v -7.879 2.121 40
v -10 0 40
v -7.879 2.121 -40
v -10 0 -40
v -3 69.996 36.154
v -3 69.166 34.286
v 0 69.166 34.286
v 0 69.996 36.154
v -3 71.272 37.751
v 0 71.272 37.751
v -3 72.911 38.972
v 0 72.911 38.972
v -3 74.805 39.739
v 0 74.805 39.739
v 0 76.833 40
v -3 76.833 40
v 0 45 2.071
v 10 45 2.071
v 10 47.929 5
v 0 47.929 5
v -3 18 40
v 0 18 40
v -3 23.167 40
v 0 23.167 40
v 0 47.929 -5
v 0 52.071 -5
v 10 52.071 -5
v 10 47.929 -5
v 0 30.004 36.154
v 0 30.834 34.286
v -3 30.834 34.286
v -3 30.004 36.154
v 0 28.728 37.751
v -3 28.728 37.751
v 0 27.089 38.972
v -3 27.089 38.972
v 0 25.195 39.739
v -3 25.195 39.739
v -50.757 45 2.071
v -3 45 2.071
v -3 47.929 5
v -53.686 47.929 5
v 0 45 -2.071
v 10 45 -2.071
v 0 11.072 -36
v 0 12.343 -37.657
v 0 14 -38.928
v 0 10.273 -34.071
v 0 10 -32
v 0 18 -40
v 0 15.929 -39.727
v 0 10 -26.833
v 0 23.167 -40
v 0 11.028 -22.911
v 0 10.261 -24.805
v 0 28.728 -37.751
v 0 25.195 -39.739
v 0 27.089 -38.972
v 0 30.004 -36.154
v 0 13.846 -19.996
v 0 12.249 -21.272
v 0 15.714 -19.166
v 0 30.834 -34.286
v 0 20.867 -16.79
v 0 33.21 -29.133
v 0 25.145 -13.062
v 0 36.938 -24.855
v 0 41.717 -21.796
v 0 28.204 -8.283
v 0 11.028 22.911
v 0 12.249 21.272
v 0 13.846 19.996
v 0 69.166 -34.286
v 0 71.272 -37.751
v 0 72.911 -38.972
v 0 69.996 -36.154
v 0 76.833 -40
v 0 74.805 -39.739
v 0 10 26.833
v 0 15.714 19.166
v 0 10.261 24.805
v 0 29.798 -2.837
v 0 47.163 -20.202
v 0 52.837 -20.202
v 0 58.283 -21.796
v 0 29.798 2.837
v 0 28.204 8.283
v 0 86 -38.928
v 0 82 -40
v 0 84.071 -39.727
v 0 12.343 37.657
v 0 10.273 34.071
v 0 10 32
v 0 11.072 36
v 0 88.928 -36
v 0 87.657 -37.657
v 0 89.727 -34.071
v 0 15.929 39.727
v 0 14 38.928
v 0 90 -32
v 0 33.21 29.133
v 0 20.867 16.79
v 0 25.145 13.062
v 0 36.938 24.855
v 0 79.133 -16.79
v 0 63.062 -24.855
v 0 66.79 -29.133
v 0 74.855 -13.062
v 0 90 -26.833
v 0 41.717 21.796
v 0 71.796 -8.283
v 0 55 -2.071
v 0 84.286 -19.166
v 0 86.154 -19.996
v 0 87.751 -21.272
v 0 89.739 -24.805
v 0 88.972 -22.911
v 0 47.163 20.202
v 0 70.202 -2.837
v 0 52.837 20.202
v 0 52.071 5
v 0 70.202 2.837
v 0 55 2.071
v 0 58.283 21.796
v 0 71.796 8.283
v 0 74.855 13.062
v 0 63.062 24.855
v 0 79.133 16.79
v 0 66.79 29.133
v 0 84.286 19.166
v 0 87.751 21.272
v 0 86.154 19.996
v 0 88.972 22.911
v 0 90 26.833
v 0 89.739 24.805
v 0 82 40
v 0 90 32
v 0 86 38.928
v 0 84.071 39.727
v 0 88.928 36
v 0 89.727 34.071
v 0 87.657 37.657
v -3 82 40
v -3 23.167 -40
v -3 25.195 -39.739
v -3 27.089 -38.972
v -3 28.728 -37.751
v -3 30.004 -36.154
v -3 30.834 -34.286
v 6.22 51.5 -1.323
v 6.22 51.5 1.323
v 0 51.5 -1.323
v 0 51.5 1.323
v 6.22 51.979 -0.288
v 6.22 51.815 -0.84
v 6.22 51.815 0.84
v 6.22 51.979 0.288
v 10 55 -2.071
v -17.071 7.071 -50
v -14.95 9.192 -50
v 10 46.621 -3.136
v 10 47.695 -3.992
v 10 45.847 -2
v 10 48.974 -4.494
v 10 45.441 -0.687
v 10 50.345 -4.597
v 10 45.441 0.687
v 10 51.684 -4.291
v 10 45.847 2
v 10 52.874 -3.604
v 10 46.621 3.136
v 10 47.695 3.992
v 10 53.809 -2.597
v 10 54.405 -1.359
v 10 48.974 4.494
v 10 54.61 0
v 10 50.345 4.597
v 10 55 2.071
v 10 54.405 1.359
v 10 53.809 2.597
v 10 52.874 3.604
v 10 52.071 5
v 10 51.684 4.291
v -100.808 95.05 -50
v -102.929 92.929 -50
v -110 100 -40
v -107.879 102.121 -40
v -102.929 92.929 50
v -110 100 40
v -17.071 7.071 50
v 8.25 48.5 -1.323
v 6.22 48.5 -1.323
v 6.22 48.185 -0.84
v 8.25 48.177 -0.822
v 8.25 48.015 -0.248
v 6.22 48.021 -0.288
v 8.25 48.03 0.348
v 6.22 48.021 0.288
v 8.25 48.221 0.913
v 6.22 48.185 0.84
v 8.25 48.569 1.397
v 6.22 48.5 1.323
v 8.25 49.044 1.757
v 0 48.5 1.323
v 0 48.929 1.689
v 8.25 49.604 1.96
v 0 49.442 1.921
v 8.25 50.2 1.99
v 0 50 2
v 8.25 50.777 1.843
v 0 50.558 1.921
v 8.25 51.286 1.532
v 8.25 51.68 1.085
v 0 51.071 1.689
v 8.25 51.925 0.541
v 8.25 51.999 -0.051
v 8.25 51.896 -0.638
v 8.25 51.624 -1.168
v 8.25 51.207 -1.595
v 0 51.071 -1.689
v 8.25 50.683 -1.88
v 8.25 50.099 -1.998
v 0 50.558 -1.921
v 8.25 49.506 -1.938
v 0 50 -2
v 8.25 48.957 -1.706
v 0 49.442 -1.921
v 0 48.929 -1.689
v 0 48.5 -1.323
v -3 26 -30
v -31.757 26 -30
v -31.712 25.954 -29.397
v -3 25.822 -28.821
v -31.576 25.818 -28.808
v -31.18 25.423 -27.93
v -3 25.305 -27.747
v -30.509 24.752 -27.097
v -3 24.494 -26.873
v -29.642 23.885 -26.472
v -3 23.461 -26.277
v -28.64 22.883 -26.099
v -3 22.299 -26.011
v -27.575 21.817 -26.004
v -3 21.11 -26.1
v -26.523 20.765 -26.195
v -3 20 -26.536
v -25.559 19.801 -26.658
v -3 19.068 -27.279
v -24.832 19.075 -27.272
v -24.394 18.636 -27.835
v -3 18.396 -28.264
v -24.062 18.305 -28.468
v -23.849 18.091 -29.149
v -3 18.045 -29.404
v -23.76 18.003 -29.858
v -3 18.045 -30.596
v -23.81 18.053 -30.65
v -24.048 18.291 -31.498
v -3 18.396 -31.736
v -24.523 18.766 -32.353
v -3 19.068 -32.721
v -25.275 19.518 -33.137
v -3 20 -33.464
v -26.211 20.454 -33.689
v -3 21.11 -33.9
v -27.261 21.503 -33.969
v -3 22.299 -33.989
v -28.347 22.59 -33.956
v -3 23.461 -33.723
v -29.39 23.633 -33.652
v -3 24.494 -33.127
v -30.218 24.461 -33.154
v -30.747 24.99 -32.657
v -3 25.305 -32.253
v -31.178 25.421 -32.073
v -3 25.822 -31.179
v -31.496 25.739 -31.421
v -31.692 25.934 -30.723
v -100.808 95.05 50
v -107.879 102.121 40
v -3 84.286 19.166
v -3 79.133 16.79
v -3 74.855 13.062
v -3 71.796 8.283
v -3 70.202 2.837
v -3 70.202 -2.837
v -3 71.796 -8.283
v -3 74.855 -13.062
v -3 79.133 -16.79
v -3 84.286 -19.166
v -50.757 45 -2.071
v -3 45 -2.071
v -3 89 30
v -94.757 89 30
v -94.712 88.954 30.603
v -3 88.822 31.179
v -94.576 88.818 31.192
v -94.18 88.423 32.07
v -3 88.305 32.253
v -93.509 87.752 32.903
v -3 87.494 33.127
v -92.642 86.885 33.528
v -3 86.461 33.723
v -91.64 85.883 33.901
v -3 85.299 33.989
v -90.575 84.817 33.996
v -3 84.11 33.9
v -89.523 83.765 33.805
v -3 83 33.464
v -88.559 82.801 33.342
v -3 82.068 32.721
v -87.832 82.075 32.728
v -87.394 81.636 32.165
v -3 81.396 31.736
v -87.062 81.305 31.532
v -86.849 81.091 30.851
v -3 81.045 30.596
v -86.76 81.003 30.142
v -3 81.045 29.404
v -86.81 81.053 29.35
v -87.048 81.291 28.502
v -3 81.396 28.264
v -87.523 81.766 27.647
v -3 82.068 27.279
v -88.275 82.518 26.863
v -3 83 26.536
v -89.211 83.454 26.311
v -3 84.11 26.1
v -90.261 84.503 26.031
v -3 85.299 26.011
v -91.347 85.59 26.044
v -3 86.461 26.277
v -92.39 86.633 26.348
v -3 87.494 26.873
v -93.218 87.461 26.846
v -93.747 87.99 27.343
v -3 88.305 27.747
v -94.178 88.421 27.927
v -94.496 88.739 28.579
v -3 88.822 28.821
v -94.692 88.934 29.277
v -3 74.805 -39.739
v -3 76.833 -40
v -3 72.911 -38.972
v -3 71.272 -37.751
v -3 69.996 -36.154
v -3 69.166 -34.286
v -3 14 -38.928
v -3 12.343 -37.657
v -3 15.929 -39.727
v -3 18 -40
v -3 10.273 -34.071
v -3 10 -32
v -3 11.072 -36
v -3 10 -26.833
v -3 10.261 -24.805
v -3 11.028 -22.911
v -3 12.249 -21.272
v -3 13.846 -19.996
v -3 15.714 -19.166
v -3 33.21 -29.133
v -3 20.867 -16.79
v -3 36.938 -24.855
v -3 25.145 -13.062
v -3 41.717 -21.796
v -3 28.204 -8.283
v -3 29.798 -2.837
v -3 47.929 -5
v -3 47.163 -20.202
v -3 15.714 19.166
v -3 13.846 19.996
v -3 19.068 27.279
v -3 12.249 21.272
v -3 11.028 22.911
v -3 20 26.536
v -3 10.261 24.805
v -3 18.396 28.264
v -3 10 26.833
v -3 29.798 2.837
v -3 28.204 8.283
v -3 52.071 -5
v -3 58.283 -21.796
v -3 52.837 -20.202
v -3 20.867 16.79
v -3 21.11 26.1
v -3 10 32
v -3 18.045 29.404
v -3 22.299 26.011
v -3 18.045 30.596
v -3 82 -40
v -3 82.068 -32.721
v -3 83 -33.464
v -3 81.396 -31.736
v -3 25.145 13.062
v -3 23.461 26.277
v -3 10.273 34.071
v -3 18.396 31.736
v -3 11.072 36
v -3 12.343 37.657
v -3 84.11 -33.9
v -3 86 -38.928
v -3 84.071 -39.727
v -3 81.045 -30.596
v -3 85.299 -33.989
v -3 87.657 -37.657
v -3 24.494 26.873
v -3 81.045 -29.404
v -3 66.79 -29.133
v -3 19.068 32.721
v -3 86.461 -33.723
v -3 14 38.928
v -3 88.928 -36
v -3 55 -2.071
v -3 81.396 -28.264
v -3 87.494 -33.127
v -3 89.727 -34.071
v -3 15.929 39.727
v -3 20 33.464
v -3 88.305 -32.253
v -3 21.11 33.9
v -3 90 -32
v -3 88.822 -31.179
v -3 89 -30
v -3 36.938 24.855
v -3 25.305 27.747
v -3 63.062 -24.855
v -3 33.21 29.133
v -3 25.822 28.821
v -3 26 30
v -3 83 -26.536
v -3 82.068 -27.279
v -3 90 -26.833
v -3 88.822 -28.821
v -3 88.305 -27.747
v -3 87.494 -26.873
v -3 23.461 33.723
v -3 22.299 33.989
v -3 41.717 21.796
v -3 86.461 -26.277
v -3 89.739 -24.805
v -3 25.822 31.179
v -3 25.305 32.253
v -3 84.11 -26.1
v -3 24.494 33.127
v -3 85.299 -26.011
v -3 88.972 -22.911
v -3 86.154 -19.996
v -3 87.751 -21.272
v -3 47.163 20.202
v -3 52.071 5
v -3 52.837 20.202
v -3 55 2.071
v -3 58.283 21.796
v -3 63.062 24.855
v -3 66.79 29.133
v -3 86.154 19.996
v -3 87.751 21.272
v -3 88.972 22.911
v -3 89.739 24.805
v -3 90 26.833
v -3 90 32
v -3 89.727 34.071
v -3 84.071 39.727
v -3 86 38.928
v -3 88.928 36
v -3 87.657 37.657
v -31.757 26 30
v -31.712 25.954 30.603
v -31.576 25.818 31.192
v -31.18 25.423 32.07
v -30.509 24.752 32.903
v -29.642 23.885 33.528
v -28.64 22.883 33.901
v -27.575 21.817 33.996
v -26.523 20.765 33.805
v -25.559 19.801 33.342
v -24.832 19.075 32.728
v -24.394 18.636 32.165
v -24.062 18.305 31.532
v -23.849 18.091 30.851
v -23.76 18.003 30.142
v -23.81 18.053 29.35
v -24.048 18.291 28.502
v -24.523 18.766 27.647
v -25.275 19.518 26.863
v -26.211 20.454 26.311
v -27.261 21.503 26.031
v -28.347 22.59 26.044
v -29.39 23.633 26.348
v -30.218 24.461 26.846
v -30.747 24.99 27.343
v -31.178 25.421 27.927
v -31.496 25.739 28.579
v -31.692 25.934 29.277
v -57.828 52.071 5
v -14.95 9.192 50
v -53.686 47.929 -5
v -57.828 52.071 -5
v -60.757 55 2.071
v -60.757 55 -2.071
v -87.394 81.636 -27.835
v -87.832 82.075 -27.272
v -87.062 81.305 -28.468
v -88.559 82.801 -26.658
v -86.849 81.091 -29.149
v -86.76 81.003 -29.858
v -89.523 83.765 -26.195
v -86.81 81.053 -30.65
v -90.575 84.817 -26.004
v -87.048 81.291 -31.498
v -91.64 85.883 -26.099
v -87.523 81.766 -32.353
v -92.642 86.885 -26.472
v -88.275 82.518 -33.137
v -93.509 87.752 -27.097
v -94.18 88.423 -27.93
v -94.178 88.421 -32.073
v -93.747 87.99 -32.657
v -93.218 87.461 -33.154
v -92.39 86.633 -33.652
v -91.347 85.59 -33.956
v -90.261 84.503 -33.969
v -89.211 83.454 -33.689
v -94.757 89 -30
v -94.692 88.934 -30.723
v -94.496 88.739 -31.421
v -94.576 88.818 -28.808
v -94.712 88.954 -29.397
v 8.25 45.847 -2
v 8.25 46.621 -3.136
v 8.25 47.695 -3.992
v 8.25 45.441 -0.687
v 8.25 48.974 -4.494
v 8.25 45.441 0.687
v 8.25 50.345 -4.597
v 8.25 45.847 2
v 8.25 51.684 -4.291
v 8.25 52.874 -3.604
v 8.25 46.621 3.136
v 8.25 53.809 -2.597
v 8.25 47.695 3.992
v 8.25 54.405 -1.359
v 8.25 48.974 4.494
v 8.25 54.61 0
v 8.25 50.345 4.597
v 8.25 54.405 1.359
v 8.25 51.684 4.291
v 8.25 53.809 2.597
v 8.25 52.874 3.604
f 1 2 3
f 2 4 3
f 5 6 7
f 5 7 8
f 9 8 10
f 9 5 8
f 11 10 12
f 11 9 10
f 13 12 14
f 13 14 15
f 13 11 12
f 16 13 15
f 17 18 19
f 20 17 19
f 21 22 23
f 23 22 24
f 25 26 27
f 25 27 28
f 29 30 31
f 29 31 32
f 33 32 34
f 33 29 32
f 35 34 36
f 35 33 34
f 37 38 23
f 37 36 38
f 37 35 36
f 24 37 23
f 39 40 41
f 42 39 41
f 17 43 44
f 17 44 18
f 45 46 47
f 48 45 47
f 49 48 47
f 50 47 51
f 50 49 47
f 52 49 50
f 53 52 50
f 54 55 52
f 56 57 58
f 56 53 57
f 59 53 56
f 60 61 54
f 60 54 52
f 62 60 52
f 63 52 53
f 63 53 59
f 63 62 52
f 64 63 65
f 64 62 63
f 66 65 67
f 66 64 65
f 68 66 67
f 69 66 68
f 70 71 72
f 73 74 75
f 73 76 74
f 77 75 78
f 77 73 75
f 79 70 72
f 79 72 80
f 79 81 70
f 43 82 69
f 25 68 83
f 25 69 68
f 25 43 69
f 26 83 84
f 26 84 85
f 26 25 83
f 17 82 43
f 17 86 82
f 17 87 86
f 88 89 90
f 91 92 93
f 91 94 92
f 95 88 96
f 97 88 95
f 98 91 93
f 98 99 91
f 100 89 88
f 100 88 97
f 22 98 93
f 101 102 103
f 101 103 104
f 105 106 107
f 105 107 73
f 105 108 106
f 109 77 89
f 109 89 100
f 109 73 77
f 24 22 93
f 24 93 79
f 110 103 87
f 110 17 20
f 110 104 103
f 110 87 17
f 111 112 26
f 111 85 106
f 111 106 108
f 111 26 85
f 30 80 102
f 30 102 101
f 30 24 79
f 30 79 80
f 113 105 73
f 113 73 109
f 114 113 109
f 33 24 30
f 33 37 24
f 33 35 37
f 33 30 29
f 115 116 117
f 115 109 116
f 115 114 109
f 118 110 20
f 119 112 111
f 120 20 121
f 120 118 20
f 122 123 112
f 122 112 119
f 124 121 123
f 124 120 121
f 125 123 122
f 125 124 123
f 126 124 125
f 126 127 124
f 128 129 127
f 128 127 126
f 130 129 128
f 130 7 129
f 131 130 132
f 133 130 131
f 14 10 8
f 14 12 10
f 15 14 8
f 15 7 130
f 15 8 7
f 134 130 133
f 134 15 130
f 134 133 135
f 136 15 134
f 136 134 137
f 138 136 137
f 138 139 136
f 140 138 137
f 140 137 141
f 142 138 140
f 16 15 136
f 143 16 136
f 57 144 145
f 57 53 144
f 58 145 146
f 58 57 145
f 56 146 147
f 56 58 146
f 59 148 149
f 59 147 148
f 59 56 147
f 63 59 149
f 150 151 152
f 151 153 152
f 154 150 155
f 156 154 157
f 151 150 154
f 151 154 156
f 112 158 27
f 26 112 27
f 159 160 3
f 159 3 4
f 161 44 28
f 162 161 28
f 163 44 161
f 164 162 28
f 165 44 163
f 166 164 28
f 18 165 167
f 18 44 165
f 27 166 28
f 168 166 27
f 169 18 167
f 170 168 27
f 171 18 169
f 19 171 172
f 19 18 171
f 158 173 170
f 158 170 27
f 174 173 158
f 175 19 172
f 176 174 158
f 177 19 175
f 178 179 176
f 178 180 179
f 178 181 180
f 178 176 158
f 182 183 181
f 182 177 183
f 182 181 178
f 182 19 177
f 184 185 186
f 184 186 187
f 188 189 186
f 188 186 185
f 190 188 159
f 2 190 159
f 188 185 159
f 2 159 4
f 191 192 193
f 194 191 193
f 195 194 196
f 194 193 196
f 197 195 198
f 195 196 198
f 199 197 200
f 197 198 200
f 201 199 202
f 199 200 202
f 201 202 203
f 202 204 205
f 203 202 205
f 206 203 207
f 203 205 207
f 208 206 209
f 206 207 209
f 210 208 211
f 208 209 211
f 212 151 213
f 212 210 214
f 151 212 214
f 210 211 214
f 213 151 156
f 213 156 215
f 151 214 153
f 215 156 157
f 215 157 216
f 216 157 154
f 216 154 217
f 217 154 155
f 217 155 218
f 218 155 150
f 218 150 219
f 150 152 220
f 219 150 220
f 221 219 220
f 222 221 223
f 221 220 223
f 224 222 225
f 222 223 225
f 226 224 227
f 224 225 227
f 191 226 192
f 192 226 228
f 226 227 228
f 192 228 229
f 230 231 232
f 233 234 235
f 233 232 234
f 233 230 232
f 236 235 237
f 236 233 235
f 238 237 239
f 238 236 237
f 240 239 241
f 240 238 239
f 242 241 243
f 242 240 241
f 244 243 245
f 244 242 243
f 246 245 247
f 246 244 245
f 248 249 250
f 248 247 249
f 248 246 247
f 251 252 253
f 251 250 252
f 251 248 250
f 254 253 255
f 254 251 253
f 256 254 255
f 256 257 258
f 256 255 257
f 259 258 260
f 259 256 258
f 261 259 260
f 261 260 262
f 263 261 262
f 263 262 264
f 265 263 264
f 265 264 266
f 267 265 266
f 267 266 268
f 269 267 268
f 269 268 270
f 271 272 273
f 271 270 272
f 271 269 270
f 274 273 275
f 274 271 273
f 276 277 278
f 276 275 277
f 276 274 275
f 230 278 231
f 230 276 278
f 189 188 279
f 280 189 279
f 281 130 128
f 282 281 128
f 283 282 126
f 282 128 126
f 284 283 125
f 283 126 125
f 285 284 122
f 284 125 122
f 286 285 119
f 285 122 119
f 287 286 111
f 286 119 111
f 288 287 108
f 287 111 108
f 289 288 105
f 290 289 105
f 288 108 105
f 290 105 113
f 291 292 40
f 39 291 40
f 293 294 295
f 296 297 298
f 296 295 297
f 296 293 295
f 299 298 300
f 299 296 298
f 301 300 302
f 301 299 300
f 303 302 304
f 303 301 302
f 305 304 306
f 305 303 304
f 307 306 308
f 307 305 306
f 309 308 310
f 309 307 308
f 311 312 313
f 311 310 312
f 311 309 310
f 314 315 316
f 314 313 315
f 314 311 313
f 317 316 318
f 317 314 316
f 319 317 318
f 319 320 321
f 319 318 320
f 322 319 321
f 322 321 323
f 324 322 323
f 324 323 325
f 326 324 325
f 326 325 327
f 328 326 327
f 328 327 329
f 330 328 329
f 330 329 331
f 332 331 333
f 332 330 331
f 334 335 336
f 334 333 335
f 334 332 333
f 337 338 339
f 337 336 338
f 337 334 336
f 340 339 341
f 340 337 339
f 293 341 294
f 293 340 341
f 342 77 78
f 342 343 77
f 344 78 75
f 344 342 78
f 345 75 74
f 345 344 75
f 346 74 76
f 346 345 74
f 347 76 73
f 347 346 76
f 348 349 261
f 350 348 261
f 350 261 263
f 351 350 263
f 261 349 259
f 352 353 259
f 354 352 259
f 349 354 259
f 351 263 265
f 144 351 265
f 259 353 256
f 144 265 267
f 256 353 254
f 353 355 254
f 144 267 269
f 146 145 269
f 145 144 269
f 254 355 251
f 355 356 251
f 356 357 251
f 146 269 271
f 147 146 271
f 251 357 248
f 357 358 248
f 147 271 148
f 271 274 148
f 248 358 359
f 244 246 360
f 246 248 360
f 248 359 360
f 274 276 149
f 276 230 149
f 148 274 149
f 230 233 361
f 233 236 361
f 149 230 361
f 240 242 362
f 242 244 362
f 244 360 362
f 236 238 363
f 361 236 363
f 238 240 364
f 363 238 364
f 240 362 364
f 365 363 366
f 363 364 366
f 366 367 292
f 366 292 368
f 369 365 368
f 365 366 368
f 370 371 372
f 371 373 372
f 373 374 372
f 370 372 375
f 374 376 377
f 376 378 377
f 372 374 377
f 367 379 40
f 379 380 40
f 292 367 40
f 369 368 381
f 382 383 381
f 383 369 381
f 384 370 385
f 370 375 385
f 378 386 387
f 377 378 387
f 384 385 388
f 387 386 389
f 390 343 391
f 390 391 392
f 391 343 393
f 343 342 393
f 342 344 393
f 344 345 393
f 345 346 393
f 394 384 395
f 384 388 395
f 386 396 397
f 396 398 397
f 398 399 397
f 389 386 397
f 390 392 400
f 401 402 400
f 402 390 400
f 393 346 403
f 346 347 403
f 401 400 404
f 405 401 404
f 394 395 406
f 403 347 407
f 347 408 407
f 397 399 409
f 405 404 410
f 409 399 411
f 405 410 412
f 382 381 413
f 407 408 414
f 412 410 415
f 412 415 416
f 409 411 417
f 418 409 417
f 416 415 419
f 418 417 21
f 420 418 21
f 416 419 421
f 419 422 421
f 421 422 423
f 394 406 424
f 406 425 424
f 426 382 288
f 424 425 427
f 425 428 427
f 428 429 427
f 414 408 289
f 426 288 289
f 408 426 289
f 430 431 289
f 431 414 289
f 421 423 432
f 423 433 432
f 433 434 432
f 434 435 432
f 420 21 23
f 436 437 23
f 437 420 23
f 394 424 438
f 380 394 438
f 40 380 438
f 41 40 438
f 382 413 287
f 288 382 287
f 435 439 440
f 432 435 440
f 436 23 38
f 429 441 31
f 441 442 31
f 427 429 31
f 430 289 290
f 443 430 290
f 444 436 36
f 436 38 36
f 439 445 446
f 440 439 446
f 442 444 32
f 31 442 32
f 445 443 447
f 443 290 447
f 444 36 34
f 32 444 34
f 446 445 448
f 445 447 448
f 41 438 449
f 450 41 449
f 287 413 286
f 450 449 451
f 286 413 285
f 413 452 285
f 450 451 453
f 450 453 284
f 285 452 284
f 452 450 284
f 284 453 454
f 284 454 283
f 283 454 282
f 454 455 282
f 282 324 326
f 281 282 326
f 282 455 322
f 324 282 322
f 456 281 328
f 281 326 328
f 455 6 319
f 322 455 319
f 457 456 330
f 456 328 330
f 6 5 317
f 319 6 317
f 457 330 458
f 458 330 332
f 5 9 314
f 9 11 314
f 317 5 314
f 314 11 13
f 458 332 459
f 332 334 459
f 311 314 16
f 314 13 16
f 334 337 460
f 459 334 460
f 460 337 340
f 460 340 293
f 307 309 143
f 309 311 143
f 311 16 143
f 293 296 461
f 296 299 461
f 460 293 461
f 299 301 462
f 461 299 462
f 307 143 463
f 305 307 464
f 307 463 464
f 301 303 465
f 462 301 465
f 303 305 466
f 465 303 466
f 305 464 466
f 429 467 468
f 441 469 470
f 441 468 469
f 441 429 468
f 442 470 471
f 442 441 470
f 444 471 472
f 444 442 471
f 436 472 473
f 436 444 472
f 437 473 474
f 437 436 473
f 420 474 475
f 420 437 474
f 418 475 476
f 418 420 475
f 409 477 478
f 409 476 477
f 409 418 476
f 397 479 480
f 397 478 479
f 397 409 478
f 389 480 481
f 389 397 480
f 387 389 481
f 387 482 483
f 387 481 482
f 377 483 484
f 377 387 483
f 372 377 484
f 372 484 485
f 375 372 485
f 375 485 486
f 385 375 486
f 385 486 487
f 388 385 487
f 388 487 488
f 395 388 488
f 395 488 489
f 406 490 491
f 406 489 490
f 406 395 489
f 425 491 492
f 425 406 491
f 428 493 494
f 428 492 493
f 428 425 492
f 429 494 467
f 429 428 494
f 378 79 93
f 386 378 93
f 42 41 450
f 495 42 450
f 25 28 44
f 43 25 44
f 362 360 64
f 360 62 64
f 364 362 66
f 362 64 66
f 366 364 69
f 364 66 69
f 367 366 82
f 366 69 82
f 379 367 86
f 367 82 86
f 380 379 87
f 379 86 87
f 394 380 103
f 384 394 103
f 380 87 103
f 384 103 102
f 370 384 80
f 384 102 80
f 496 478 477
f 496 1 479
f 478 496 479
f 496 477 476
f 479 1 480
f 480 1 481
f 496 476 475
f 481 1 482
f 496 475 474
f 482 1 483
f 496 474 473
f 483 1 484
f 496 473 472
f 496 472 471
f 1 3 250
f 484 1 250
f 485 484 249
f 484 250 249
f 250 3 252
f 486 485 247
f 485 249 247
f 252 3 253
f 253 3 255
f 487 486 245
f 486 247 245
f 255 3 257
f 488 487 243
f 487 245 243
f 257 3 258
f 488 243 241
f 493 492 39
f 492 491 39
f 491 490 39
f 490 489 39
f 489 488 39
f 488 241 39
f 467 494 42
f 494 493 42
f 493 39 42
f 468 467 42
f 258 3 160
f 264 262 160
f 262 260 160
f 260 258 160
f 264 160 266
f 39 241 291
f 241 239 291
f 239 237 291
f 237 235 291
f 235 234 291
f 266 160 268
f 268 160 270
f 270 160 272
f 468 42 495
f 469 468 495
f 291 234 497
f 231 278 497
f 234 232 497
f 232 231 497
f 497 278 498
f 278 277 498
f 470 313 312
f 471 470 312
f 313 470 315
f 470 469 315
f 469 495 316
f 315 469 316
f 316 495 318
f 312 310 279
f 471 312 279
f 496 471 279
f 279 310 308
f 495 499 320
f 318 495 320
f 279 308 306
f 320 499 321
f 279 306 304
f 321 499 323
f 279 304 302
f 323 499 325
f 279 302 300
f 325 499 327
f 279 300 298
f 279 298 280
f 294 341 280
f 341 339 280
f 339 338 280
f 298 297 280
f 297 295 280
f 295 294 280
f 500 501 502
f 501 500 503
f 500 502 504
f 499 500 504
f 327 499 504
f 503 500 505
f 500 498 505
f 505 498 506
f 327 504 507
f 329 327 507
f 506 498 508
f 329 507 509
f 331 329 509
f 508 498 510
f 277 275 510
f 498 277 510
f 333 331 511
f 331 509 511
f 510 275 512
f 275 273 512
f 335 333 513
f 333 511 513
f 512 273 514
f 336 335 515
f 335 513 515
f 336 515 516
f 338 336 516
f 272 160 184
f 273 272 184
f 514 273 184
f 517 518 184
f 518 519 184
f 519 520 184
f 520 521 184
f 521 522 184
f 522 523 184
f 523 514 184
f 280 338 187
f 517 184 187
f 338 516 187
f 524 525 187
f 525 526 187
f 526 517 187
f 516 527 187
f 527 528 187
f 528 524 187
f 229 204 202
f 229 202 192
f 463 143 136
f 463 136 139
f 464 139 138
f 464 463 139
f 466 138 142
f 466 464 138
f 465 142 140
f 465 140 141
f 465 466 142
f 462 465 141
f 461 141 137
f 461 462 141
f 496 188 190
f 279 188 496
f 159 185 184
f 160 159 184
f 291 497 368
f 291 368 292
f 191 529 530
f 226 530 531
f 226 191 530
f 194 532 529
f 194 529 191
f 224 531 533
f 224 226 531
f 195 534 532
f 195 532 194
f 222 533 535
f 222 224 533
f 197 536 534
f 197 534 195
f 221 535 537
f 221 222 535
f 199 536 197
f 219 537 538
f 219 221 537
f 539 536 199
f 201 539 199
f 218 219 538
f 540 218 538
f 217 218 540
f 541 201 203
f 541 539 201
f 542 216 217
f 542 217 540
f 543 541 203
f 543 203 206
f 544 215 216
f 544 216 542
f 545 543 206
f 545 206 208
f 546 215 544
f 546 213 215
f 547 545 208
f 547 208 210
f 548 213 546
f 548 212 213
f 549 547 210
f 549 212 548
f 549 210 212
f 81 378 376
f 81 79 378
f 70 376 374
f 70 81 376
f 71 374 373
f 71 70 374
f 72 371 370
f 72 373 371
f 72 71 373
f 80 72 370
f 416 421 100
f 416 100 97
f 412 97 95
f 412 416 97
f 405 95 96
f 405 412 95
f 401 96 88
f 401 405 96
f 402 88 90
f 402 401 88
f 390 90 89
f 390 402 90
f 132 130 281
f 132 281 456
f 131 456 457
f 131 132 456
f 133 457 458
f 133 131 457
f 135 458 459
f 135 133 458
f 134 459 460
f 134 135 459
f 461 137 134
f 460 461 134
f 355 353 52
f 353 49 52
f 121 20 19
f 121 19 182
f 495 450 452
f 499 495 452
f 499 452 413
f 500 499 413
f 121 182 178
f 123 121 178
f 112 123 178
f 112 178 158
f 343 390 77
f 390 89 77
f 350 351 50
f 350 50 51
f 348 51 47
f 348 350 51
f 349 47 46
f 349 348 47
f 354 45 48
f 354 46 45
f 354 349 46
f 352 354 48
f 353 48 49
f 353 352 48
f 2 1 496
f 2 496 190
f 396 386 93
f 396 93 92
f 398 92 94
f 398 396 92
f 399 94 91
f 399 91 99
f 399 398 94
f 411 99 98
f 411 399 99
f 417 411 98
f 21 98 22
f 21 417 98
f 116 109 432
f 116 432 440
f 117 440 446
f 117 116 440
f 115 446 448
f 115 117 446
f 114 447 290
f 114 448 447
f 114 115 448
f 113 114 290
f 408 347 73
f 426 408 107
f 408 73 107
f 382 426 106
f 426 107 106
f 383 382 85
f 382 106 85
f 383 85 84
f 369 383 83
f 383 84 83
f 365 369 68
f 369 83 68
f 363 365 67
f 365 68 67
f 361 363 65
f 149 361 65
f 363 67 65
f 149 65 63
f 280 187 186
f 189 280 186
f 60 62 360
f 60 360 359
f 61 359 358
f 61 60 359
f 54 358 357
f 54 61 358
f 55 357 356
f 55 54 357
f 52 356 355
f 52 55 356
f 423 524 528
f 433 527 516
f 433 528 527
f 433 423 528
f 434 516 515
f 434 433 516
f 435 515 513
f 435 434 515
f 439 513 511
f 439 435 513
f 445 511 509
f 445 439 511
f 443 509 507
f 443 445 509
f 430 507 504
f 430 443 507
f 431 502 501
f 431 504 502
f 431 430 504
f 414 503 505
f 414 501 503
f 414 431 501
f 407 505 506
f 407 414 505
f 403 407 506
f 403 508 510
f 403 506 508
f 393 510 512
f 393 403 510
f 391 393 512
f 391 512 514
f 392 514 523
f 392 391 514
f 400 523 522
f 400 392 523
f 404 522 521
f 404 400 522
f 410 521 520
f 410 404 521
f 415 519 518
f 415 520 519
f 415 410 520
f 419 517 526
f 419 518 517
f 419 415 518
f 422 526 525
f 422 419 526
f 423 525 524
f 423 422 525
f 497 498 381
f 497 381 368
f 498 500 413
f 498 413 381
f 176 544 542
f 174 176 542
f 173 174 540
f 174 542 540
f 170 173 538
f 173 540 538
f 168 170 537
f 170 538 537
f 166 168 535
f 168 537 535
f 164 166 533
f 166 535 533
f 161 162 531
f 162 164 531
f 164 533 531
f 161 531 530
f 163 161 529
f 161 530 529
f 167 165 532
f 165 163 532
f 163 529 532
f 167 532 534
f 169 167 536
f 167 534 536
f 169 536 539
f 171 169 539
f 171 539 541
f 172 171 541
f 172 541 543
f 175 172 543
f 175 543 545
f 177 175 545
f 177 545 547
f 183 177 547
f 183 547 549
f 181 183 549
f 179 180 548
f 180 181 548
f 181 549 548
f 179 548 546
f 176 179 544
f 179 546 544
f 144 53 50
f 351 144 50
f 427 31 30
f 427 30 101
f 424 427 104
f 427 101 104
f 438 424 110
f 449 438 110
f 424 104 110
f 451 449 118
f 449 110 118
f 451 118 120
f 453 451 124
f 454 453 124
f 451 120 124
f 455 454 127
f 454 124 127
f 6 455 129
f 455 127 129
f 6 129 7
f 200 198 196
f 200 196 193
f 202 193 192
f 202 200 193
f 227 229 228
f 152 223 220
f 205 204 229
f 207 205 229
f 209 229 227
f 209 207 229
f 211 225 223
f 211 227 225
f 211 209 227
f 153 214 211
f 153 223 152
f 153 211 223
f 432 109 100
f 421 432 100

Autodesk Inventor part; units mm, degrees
ref_plane "YZ Plane" through (0, 0, 0) normal (1, 0, 0) x (0, 1, 0)
ref_plane "XZ Plane" through (0, 0, 0) normal (0, 1, 0) x (-1, 0, 0)
ref_plane "XY Plane" through (0, 0, 0) normal (0, 0, 1) x (1, 0, 0)
sketch "Sketch1" plane through (0, 0, 0) normal (0, 0, 1) x (1, 0, 0)
  line L0 (-10, 0) -> (-7.8787, 2.1213)
  line L1 (-7.8787, 2.1213) -> (-107.8787, 102.1213)
  line L2 (-107.8787, 102.1213) -> (-110, 100)
  line L3 (-110, 100) -> (-10, 0)
  line L4 (-10, 0) -> (0, 0) construction
  dimension "d24" = 10
  dimension "d25" = 3
  dimension "d26" = 45
  dimension "d27" = 100
extrude "Extrusion1" add sketch "Sketch1" along normal mid plane 100
chamfer "Chamfer1" distance 10 angle 45 4 edges at (-108.9393, 101.0607, 50) (-8.9393, 1.0607, 50) (-8.9393, 1.0607, -50) (-108.9393, 101.0607, -50)
sketch "Sketch2" plane through (0, 0, 0) normal (1, 0, 0) x (0, 1, 0)
  arc A0 (51.5, -1.3229) -> (51.5, 1.3229) centre (50, 0) ccw
  line L0 (55, -2.0711) -> (52.0711, -5)
  line L1 (52.0711, -5) -> (47.9289, -5)
  line L2 (47.9289, -5) -> (45, -2.0711)
  line L3 (45, -2.0711) -> (45, 2.0711)
  line L4 (45, 2.0711) -> (47.9289, 5)
  line L5 (47.9289, 5) -> (52.0711, 5)
  line L6 (52.0711, 5) -> (55, 2.0711)
  line L7 (55, 2.0711) -> (55, -2.0711)
  line L8 (51.5, 1.3229) -> (51.5, -1.3229)
  line L9 (48.5, 1.3229) -> (48.5, -1.3229)
  arc A1 (48.5, -1.3229) -> (51.5, -1.3229) centre (50, 0) ccw
  arc A2 (51.5, 1.3229) -> (48.5, -1.3229) centre (50, 0) ccw
  circle A3 centre (85, 30) radius 4
  circle A4 centre (85, -30) radius 4
  circle A5 centre (22, 30) radius 4
  circle A6 centre (22, -30) radius 4
  line L10 (10, 40) -> (90, 40)
  line L11 (90, 40) -> (90, -40)
  line L12 (90, -40) -> (10, -40)
  line L13 (10, -40) -> (10, 40)
  line L14 (10, 40) -> (90, -40) construction
  line L15 (90, 40) -> (10, -40) construction
  circle A7 centre (50, 40) radius 20
  circle A8 centre (50, -40) radius 20
  circle A9 centre (90, 0) radius 20
  circle A10 centre (50, 0) radius 4.61
  circle A11 centre (10, 0) radius 20
  point P0 (0, 0)
  point P1 (0, 0)
  point P2 (50, 0)
  dimension "d8" = 50
  dimension "d10" = 4
  dimension "d11" = 5
  dimension "d14" = 3
  dimension "d15" = 30
  dimension "d16" = 30
  dimension "d17" = 35
  dimension "d18" = 28
  dimension "d19" = 8
  dimension "d28" = 80
  dimension "d29" = 80
  dimension "d35" = 9.22
  dimension "d38" = 40
extrude "Extrusion2" add sketch "Sketch2" against normal up to next contours L8 A0 | A1 L9 A2 L8 | A2 L9 | L0 L1 L2 L3 L4 L5 L6 L7 | A10
extrude "Extrusion3" add sketch "Sketch2" against normal blind 3 contours A7 L10 | L10 L11 A9 L12 A8 L13 A11 A7 | L11 A9 | A11 L13 | L12 A8 picked at (44.8162, 33.9837) picked at (86.9018, -5.903) picked at (22.2846, 1.4835) picked at (43.3333, -31.1584)
extrude "Extrusion4" add sketch "Sketch2" against normal up to next contours A3 | A4 | A5 | A6
extrude "Extrusion5" cut sketch "Sketch2" against normal up to surface (3 mm away) contours A7 L10 | L10 A7 | A9 L11 | L11 A9 | A11 L13 | L13 A11 | A8 L12 | L12 A8
fillet "Fillet2" radius 8 12 edges at (-1.5, 30, 40) (-1.5, 70, 40) (-1.5, 10, 40) (-1.5, 10, -40) (-1.5, 70, -40) (-1.5, 30, -40) (-1.5, 90, -40) (-1.5, 90, 20) (-1.5, 90, -20) (-1.5, 90, 40) (-1.5, 10, 20) (-1.5, 10, -20)
extrude "Extrusion7" add sketch "Sketch2" along normal blind 10 contours L0 L1 L2 L3 L4 L5 L6 L7
extrude "Extrusion8" add sketch "Sketch2" along normal blind 8.25 contours A10
extrude "Extrusion9" add sketch "Sketch2" along normal blind 6.22 contours L8 A0 | A2 L9
properties part number "MIRROR MOUNT"
